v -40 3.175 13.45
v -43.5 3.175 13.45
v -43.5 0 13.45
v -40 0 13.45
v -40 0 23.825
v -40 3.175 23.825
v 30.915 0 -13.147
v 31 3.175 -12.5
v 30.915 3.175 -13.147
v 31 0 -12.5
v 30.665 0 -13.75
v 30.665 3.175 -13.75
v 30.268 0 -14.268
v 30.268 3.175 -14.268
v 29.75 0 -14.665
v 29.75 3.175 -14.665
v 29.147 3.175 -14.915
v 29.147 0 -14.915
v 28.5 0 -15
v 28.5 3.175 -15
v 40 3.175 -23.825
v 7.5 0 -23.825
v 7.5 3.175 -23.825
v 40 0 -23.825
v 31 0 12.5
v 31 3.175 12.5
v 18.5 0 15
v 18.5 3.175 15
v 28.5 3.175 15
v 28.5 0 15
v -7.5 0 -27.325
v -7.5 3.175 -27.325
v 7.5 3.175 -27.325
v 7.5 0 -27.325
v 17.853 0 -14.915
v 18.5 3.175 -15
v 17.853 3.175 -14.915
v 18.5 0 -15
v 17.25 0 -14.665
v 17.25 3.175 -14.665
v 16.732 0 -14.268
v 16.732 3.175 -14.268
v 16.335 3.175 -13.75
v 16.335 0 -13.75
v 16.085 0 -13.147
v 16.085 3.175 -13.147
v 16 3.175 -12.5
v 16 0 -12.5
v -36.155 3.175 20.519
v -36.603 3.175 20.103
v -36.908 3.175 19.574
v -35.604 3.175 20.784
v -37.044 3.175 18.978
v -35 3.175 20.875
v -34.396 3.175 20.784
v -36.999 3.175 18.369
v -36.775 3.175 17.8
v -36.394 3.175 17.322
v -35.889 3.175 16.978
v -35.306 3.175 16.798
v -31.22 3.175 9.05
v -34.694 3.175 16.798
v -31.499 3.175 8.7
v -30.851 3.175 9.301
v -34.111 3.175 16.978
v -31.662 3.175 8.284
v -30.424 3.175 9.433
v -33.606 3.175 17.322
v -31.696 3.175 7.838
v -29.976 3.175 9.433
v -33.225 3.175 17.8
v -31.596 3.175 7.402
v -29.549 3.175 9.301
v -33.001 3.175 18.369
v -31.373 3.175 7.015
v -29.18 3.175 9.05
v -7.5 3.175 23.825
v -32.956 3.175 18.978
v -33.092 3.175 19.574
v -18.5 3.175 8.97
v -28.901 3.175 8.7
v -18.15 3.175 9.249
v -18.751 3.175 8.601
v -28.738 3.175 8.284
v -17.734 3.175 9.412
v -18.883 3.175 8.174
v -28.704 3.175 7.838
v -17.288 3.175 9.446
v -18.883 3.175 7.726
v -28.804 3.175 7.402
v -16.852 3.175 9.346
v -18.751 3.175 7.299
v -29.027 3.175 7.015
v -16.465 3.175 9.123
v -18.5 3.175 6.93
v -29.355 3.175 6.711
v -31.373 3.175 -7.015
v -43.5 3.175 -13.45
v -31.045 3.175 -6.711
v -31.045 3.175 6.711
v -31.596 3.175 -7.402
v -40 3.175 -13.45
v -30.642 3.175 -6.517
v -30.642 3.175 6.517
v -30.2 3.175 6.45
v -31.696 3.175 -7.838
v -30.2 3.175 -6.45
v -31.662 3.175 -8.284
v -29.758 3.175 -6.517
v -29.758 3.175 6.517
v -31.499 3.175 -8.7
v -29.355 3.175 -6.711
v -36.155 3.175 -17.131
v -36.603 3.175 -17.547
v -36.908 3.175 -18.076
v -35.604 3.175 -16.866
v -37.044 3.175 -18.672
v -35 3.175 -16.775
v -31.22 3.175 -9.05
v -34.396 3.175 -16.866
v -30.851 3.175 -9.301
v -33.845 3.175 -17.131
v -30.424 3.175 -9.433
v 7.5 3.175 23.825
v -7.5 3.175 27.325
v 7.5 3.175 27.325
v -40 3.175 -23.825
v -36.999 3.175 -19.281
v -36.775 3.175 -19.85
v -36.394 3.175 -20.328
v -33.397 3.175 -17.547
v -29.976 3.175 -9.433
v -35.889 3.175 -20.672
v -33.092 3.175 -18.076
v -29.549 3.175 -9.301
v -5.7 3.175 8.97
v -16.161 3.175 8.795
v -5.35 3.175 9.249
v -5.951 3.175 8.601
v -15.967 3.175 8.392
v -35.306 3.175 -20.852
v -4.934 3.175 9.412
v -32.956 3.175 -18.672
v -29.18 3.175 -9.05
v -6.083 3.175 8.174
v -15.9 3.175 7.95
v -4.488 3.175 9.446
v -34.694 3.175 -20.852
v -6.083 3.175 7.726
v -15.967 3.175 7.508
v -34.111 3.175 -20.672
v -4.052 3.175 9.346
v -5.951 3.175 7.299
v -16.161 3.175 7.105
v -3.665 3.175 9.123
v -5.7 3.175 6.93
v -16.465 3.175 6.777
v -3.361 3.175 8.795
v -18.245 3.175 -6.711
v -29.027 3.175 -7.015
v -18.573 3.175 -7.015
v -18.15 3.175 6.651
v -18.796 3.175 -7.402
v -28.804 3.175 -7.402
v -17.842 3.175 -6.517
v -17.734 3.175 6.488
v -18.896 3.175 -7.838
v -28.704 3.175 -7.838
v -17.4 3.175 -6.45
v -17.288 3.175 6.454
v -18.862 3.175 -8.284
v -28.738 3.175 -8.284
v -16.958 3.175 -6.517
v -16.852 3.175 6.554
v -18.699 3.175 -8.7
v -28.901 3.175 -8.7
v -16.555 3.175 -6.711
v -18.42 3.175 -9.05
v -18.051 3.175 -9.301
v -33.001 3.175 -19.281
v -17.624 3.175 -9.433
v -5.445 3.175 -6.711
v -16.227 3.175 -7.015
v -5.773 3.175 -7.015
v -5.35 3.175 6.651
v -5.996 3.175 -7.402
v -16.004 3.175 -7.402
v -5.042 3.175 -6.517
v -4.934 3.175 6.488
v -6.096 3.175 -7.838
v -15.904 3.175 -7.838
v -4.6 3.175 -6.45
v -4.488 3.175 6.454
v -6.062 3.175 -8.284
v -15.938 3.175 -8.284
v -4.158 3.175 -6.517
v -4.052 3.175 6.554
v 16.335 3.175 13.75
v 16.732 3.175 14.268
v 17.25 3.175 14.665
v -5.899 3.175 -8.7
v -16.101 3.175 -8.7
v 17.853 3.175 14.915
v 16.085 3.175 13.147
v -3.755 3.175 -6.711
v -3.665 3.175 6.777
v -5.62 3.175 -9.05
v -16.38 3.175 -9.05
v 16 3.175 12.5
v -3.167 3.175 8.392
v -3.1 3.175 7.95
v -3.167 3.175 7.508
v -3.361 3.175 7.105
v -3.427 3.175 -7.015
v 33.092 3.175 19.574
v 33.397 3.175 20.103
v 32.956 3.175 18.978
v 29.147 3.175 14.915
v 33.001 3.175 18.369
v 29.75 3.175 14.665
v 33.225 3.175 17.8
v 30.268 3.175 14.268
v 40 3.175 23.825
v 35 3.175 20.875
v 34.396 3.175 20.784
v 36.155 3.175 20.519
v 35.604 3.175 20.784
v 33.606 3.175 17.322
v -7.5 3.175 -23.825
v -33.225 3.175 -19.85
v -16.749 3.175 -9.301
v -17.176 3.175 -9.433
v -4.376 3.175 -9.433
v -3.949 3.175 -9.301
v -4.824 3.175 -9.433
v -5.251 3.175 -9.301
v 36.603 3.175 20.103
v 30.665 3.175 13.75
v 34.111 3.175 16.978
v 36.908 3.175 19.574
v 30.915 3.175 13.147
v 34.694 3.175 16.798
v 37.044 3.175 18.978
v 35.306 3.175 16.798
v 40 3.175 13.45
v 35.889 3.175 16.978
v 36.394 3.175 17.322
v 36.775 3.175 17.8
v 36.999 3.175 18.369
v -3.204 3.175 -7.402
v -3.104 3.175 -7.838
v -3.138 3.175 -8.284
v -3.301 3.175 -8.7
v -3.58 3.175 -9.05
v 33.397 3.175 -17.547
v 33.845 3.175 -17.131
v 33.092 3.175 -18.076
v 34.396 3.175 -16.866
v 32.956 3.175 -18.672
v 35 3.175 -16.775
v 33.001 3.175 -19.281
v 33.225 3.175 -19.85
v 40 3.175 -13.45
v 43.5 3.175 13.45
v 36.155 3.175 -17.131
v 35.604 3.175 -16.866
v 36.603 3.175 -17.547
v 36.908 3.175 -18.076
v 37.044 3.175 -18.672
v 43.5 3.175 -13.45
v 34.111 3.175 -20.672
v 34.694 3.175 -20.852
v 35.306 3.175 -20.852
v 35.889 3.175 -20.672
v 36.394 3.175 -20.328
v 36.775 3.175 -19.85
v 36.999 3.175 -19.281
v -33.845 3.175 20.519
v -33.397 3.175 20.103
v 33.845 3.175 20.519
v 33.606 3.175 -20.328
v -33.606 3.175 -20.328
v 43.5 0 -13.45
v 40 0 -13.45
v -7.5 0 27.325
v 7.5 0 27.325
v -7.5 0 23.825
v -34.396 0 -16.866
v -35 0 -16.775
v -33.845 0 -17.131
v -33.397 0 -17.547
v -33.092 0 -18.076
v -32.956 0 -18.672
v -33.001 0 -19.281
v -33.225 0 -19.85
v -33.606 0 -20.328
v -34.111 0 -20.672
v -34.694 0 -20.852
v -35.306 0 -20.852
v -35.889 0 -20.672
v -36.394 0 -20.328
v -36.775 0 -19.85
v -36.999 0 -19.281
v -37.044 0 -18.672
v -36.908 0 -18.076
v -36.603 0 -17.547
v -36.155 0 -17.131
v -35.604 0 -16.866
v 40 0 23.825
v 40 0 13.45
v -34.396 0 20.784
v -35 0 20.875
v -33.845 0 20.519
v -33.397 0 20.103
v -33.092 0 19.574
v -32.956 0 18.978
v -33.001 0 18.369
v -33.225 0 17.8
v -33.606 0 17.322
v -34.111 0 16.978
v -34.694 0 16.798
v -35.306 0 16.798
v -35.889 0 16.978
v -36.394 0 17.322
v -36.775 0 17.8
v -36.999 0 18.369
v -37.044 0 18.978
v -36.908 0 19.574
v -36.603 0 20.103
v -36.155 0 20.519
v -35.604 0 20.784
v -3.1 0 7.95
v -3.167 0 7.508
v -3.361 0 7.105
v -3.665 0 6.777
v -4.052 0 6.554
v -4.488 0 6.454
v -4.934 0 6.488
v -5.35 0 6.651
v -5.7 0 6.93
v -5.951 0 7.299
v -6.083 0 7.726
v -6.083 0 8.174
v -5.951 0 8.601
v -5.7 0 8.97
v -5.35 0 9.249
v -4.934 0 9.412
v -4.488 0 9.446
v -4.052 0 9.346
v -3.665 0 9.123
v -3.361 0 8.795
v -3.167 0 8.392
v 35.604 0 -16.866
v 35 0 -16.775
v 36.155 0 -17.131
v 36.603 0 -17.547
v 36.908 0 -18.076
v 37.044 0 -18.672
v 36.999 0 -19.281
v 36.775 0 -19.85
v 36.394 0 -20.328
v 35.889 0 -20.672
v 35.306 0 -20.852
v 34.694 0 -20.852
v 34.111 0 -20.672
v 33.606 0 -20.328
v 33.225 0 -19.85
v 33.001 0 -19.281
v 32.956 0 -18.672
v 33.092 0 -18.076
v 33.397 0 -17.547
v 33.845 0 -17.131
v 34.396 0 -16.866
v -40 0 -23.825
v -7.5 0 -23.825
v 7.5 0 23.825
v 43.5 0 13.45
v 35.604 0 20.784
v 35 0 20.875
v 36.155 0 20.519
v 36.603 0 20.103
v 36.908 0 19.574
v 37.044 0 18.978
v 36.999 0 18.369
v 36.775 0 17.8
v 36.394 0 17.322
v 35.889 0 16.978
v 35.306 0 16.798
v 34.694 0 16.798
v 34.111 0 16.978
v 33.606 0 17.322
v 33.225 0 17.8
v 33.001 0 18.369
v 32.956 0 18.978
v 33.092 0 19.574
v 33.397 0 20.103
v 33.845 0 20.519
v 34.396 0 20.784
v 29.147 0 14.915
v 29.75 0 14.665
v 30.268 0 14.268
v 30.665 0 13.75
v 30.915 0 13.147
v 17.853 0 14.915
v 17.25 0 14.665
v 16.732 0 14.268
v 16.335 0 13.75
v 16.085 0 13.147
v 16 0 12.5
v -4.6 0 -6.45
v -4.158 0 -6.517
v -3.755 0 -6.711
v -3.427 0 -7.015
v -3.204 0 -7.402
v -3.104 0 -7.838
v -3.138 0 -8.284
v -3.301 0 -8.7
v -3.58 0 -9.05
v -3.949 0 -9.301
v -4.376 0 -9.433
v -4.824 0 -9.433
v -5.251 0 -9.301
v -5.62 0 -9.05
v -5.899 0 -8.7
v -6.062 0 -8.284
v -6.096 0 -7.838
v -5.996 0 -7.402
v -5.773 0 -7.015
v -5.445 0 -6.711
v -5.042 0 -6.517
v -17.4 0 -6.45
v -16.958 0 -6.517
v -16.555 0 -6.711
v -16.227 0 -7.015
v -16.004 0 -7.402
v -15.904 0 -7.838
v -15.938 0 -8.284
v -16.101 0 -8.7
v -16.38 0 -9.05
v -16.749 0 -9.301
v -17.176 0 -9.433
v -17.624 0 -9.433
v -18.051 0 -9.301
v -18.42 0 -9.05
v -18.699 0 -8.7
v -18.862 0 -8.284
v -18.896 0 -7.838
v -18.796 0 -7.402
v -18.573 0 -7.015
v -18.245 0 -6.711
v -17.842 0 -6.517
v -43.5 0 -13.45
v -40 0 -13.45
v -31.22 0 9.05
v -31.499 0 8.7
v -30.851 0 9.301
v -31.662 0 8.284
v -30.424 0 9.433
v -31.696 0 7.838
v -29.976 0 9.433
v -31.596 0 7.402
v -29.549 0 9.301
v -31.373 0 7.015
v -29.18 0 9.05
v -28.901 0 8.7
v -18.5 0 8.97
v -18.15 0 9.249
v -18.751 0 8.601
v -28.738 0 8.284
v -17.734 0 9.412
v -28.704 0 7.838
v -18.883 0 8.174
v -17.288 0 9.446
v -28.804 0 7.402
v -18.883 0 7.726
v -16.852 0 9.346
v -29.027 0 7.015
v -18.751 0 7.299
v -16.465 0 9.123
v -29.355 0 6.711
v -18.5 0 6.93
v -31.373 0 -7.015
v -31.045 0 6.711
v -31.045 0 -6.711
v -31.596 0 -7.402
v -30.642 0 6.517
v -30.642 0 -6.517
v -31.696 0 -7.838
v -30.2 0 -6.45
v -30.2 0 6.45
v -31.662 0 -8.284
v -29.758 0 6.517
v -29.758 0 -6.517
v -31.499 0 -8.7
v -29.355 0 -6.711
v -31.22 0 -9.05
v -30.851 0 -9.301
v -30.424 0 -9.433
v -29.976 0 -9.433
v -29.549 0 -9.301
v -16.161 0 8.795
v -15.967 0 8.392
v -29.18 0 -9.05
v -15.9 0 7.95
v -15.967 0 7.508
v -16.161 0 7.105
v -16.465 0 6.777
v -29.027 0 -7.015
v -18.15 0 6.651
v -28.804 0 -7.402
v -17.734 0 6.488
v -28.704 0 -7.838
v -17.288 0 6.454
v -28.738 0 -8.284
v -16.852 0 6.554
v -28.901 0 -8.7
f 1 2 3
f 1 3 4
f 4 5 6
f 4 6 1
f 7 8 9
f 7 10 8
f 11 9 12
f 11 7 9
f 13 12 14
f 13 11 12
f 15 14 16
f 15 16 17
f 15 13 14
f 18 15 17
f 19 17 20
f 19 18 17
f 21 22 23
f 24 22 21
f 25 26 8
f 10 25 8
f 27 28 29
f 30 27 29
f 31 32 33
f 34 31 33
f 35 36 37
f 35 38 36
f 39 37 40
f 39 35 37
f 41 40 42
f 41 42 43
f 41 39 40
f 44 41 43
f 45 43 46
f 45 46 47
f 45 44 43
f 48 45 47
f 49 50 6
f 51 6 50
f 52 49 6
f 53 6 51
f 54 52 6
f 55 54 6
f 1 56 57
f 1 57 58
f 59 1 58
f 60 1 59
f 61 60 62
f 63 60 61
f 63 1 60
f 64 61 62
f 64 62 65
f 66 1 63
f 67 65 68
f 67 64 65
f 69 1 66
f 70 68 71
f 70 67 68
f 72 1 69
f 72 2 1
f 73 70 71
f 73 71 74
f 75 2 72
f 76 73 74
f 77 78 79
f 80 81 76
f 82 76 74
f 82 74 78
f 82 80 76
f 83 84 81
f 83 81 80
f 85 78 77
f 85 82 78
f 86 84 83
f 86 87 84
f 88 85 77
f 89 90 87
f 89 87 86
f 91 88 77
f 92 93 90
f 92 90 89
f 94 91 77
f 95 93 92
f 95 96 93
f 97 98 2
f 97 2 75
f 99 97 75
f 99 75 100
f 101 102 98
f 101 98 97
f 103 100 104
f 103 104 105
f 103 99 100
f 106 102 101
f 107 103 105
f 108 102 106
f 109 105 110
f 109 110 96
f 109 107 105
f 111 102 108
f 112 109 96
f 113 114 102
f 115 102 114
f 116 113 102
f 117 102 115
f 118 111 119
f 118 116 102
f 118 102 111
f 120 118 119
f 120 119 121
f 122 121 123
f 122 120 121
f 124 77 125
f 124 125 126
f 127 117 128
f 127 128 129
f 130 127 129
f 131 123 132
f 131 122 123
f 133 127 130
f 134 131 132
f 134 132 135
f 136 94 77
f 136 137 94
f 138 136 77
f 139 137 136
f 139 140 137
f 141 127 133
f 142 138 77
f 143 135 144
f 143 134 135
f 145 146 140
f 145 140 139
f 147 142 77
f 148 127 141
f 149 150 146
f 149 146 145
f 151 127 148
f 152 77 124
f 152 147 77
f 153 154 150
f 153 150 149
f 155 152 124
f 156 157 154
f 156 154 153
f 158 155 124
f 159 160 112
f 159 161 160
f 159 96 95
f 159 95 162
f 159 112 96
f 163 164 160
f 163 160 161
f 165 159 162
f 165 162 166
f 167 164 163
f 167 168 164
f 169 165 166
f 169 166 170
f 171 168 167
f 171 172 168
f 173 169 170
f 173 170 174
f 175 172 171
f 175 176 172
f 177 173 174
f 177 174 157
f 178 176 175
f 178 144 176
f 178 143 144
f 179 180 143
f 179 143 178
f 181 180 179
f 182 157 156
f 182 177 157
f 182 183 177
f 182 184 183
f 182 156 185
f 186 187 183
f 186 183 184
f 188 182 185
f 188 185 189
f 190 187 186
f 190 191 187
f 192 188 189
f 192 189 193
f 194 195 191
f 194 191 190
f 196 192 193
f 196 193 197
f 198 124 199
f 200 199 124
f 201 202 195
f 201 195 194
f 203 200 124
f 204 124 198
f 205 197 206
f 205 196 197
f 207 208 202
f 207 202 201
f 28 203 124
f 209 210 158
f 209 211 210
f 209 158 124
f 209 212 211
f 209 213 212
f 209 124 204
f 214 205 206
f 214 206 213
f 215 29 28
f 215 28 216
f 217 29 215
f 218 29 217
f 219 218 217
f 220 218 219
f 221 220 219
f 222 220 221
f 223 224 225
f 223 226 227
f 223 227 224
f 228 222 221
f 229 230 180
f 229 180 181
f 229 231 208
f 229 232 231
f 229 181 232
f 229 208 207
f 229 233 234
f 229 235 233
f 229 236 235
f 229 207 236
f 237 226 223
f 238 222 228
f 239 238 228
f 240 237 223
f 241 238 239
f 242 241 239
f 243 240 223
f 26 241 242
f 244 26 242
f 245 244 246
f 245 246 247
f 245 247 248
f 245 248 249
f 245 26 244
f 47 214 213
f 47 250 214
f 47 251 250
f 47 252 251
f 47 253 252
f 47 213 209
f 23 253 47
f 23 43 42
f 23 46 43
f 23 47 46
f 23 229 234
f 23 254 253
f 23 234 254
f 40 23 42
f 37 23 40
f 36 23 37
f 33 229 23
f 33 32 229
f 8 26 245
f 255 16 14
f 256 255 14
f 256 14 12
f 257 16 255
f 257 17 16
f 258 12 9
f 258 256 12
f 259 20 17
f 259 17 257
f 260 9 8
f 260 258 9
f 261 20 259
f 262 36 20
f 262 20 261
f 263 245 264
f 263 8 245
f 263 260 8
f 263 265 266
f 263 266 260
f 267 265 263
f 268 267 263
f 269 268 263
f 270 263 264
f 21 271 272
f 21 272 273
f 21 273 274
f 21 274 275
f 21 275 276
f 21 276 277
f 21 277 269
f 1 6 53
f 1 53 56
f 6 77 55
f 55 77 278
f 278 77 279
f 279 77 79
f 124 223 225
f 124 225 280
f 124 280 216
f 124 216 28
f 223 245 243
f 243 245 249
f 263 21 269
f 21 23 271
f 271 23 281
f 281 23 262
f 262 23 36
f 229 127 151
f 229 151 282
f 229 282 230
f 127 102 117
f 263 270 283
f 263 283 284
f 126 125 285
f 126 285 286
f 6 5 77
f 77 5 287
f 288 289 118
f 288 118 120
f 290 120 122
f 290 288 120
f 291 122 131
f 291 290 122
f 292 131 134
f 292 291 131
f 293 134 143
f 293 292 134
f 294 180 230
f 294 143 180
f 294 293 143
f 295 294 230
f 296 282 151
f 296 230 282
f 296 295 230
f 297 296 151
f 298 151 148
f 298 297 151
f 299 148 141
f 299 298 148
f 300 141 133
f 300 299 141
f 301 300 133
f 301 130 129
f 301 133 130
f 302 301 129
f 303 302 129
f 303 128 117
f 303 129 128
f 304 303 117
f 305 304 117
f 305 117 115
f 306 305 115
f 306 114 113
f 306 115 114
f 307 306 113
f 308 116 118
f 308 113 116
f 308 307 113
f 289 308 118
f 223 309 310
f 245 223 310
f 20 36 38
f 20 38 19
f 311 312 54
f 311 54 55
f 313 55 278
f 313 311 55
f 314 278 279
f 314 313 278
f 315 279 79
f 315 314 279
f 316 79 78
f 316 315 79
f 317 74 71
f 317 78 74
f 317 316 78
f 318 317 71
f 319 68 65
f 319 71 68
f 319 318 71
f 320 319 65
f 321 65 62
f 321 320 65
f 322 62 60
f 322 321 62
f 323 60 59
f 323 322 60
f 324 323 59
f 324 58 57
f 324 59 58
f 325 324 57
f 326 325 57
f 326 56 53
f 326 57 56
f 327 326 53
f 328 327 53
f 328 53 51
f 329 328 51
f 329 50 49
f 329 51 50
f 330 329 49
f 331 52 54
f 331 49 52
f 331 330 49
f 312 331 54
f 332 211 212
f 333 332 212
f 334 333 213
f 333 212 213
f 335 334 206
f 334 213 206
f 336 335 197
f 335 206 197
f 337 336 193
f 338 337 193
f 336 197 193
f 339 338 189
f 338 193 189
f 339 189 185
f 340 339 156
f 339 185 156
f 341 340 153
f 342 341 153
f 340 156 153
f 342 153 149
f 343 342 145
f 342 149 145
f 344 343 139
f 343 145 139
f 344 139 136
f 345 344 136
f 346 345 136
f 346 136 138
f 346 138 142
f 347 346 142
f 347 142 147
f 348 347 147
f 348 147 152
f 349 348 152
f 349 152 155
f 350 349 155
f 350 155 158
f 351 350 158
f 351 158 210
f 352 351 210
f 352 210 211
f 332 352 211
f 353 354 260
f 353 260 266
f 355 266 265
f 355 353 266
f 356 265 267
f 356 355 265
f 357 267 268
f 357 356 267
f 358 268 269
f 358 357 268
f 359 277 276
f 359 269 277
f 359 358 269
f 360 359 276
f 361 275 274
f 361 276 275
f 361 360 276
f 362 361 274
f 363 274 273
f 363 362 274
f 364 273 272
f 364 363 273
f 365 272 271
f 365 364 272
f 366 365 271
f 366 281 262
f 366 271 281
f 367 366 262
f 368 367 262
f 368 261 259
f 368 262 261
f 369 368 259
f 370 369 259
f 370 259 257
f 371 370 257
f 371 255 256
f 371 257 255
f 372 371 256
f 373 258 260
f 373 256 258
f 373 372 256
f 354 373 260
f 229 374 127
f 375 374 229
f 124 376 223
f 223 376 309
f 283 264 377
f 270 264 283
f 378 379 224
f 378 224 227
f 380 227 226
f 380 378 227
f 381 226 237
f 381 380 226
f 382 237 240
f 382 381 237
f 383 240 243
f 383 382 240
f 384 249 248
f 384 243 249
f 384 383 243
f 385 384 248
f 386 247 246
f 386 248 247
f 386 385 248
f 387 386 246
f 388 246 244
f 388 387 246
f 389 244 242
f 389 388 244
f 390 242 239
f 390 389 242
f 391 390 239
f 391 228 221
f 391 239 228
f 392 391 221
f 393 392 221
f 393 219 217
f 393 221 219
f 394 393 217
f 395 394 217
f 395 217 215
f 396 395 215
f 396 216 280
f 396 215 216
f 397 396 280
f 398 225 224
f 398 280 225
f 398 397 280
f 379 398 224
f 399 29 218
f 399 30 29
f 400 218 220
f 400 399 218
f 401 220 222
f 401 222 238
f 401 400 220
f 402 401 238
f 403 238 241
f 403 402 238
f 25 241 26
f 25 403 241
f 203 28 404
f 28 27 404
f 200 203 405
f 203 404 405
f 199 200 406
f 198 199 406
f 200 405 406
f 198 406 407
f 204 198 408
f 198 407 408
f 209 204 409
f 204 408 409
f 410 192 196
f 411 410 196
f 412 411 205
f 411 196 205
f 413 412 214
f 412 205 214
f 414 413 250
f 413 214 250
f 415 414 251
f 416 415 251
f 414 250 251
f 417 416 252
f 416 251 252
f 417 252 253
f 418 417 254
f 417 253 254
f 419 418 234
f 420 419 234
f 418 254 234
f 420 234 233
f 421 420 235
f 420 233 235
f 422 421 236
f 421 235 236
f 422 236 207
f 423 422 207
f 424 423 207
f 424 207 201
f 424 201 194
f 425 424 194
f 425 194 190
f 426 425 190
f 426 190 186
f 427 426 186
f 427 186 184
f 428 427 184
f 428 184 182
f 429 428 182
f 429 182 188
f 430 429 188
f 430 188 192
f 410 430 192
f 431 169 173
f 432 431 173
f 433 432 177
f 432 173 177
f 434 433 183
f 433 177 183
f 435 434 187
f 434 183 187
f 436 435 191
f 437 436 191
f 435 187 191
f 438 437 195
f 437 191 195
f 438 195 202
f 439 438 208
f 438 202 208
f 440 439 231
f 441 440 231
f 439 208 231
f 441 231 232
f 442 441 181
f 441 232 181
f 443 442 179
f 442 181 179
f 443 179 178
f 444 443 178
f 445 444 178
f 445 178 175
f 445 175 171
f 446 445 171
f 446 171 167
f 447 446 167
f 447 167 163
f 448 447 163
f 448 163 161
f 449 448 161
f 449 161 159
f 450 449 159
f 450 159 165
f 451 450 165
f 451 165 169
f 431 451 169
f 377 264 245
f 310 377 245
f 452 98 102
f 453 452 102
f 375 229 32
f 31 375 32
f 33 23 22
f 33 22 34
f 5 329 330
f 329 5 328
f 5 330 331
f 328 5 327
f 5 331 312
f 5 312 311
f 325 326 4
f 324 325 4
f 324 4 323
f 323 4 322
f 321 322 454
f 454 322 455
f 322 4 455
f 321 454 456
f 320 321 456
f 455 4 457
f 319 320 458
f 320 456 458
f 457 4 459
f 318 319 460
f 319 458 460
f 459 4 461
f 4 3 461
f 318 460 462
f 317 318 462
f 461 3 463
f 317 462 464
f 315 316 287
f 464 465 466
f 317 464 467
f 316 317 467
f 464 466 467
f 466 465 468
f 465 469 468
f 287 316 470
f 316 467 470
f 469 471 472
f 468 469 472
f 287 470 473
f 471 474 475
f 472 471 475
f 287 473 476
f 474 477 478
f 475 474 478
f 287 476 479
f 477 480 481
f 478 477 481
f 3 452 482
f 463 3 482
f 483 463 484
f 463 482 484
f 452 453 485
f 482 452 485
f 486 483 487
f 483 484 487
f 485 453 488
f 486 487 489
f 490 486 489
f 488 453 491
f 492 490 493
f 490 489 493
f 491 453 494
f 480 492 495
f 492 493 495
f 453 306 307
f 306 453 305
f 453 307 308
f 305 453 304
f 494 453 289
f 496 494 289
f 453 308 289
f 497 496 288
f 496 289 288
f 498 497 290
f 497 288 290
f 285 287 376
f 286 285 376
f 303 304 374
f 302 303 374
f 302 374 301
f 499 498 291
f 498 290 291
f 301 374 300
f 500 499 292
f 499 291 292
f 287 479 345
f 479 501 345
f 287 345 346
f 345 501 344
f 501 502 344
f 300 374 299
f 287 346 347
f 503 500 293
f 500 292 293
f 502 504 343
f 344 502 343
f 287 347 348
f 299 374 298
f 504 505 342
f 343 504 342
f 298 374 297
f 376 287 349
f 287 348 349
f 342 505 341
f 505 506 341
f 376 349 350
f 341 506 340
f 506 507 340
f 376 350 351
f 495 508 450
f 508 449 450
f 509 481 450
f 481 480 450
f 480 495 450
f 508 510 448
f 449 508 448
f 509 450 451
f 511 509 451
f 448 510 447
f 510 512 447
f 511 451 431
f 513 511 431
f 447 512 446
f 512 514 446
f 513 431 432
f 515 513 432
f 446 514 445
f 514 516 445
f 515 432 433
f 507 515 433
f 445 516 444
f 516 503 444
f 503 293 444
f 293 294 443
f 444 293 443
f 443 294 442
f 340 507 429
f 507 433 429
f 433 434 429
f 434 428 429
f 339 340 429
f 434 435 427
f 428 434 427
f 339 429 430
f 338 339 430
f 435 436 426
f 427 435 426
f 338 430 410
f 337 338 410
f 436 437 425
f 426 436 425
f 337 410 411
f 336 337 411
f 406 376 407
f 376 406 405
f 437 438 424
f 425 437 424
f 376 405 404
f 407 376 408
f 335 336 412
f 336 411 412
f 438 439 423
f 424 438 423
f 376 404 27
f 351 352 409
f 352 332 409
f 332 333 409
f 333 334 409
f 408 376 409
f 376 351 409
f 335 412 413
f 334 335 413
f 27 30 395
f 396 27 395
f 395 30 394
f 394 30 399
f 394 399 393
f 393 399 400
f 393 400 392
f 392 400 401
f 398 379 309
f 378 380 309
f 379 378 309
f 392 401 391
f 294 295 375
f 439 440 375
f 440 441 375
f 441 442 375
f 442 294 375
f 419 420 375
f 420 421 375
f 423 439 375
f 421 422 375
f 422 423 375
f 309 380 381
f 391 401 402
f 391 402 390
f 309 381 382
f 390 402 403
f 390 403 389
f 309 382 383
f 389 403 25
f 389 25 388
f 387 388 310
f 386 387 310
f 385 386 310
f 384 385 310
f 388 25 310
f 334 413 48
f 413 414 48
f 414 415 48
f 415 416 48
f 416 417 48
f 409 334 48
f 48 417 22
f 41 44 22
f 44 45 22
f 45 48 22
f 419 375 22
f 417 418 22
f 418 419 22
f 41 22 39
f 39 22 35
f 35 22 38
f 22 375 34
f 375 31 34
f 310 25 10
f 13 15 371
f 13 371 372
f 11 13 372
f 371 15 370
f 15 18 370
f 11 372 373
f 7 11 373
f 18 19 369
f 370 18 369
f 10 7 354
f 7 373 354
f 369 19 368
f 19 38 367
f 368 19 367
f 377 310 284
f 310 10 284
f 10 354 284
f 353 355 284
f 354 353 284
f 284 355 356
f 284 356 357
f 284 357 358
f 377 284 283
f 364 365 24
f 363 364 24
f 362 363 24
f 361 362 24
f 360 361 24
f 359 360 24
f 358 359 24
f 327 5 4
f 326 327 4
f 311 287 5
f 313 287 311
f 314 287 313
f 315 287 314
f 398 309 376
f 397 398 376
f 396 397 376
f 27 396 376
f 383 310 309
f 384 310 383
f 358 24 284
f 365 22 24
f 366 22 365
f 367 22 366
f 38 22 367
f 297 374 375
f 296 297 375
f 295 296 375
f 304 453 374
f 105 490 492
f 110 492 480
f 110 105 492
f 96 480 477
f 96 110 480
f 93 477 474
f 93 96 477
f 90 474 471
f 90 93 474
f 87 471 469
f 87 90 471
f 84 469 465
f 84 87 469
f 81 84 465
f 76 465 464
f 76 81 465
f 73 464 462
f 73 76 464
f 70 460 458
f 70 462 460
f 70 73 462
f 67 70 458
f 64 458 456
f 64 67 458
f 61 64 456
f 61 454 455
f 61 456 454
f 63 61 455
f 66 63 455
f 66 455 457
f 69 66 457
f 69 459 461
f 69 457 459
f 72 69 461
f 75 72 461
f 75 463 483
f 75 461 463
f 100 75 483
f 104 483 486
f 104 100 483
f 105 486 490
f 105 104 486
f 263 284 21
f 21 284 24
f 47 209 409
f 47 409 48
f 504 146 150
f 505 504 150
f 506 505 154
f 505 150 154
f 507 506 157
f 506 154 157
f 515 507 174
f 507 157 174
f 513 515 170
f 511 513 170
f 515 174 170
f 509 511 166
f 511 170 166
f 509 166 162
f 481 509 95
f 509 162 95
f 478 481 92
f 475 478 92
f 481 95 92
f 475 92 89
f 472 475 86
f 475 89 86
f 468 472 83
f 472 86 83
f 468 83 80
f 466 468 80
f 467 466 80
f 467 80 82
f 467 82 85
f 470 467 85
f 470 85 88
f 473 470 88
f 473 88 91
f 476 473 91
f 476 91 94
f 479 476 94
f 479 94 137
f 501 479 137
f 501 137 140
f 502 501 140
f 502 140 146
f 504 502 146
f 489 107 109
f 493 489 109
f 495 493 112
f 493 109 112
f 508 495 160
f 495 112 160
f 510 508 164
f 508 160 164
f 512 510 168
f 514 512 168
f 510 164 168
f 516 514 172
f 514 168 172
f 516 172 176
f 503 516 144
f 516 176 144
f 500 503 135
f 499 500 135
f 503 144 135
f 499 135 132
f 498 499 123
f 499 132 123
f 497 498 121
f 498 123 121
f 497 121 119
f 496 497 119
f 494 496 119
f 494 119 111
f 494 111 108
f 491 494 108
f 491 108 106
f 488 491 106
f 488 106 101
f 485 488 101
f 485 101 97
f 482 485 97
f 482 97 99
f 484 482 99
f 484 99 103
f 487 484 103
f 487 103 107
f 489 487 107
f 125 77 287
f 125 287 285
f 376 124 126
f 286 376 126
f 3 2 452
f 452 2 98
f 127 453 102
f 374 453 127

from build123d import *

# Parameters (mm, degrees)
SKETCH2_W               = 80
SKETCH2_H               = 47.65
BOSS_EXTRUDE1_DEPTH     = 3.175
SKETCH3_W               = 15
SKETCH3_H               = 3.5
BOSS_EXTRUDE2_DEPTH     = 3.175
SKETCH4_W               = 3.5
SKETCH4_H               = 26.9
BOSS_EXTRUDE3_DEPTH     = 3.175
SKETCH5_R               = 1.5
CUT_EXTRUDE1_DEPTH      = 20
LPATTERN1_COUNT         = 3
LPATTERN1_PITCH         = 12.8
MIRROR3_COPY_1_SKETCH_R = 1.5
MIRROR3_COPY_1_DEPTH    = 20
MIRROR3_COPY_2_SKETCH_R = 1.5
MIRROR3_COPY_2_DEPTH    = 20
SKETCH6_W               = 15
SKETCH6_H               = 30
CUT_EXTRUDE2_DEPTH      = 52.468303353
FILLET1_R               = 2.5
CUT_EXTRUDE3_DEPTH      = 52.468303353
CUT_EXTRUDE3_DEPTH_BACK = 52.468303353
SKETCH7_R               = 2.05


with BuildPart() as part:
    # Sketch2 → Boss-Extrude1 (new body)
    with BuildSketch(Plane(origin=(0, 0, 0), x_dir=(1, 0, 0), z_dir=(0, 1, 0))):
        Rectangle(SKETCH2_W, SKETCH2_H)
    extrude(amount=BOSS_EXTRUDE1_DEPTH)

    # Sketch3 → Boss-Extrude2 (add)
    with BuildSketch(Plane(origin=(0, 3.175, 0), x_dir=(1, 0, 0), z_dir=(0, 1, 0))):
        with Locations((0, 25.575)):
            Rectangle(SKETCH3_W, SKETCH3_H)
    boss_extrude2 = extrude(amount=-BOSS_EXTRUDE2_DEPTH)

    # Sketch4 → Boss-Extrude3 (add)
    with BuildSketch(Plane(origin=(0, 3.175, 0), x_dir=(1, 0, 0), z_dir=(0, 1, 0))):
        with Locations((-41.75, 0)):
            Rectangle(SKETCH4_W, SKETCH4_H)
    boss_extrude3 = extrude(amount=-BOSS_EXTRUDE3_DEPTH)

    # Mirror1: Boss-Extrude3 across plane
    add(boss_extrude3.mirror(Plane(origin=(0, 0, 0), x_dir=(0, 0, 1), z_dir=(1, 0, 0))))

    # Mirror2: Boss-Extrude2 across plane
    add(boss_extrude2.mirror(Plane.XY))

    # Sketch5 → Cut-Extrude1 (cut)
    with BuildSketch(Plane(origin=(0, 3.175, 0), x_dir=(1, 0, 0), z_dir=(0, 1, 0))):
        with Locations(Location((-30.2, 7.95, 0), (0, 0, 270))):
            Circle(SKETCH5_R)
    cut_extrude1 = extrude(amount=-CUT_EXTRUDE1_DEPTH, mode=Mode.SUBTRACT)

    # LPattern1: Cut-Extrude1 ×3
    with Locations(*[(i * LPATTERN1_PITCH, 0, 0) for i in range(1, LPATTERN1_COUNT)]):
        add(cut_extrude1, mode=Mode.SUBTRACT)

    # Mirror3: Cut-Extrude1 across plane
    add(cut_extrude1.mirror(Plane.XY), mode=Mode.SUBTRACT)

    # Mirror3 copy 1 sketch → Mirror3 copy 1 (cut)
    with BuildSketch(Plane(origin=(12.8, 3.175, 0), x_dir=(1, 0, 0), z_dir=(0, 1, 0))):
        with Locations((-30.2, -7.95)):
            Circle(MIRROR3_COPY_1_SKETCH_R)
    extrude(amount=-MIRROR3_COPY_1_DEPTH, mode=Mode.SUBTRACT)

    # Mirror3 copy 2 sketch → Mirror3 copy 2 (cut)
    with BuildSketch(Plane(origin=(25.6, 3.175, 0), x_dir=(1, 0, 0), z_dir=(0, 1, 0))):
        with Locations((-30.2, -7.95)):
            Circle(MIRROR3_COPY_2_SKETCH_R)
    extrude(amount=-MIRROR3_COPY_2_DEPTH, mode=Mode.SUBTRACT)

    # Sketch6 → Cut-Extrude2 (cut, through all)
    with BuildSketch(Plane(origin=(0, 3.175, 0), x_dir=(1, 0, 0), z_dir=(0, 1, 0))):
        with Locations((23.5, 0)):
            Rectangle(SKETCH6_W, SKETCH6_H)
    extrude(amount=-CUT_EXTRUDE2_DEPTH, mode=Mode.SUBTRACT)

    # Fillet1
    fillet1_edges = [part.edges().sort_by_distance(p)[0] for p in [
        (16, 1.5875, 15),
        (16, 1.5875, -15),
        (31, 1.5875, -15),
        (31, 1.5875, 15),
    ]]
    fillet(fillet1_edges, radius=FILLET1_R)

    # Sketch7 → Cut-Extrude3 (cut, two sides: drawn at the far end of the back side and taken through both)
    with BuildSketch(Plane(origin=(0, 3.175, 0), x_dir=(1, 0, 0), z_dir=(0, 1, 0)).offset(-CUT_EXTRUDE3_DEPTH_BACK)):
        with Locations(Location((-35, 18.825, 0), (0, 0, 270))):
            Circle(SKETCH7_R)
        with Locations(Location((35, 18.825, 0), (0, 0, 270))):
            Circle(SKETCH7_R)
        with Locations(Location((-35, -18.825, 0), (0, 0, 270))):
            Circle(SKETCH7_R)
        with Locations(Location((35, -18.825, 0), (0, 0, 270))):
            Circle(SKETCH7_R)
    extrude(amount=CUT_EXTRUDE3_DEPTH + CUT_EXTRUDE3_DEPTH_BACK, mode=Mode.SUBTRACT)


solid = part.part
